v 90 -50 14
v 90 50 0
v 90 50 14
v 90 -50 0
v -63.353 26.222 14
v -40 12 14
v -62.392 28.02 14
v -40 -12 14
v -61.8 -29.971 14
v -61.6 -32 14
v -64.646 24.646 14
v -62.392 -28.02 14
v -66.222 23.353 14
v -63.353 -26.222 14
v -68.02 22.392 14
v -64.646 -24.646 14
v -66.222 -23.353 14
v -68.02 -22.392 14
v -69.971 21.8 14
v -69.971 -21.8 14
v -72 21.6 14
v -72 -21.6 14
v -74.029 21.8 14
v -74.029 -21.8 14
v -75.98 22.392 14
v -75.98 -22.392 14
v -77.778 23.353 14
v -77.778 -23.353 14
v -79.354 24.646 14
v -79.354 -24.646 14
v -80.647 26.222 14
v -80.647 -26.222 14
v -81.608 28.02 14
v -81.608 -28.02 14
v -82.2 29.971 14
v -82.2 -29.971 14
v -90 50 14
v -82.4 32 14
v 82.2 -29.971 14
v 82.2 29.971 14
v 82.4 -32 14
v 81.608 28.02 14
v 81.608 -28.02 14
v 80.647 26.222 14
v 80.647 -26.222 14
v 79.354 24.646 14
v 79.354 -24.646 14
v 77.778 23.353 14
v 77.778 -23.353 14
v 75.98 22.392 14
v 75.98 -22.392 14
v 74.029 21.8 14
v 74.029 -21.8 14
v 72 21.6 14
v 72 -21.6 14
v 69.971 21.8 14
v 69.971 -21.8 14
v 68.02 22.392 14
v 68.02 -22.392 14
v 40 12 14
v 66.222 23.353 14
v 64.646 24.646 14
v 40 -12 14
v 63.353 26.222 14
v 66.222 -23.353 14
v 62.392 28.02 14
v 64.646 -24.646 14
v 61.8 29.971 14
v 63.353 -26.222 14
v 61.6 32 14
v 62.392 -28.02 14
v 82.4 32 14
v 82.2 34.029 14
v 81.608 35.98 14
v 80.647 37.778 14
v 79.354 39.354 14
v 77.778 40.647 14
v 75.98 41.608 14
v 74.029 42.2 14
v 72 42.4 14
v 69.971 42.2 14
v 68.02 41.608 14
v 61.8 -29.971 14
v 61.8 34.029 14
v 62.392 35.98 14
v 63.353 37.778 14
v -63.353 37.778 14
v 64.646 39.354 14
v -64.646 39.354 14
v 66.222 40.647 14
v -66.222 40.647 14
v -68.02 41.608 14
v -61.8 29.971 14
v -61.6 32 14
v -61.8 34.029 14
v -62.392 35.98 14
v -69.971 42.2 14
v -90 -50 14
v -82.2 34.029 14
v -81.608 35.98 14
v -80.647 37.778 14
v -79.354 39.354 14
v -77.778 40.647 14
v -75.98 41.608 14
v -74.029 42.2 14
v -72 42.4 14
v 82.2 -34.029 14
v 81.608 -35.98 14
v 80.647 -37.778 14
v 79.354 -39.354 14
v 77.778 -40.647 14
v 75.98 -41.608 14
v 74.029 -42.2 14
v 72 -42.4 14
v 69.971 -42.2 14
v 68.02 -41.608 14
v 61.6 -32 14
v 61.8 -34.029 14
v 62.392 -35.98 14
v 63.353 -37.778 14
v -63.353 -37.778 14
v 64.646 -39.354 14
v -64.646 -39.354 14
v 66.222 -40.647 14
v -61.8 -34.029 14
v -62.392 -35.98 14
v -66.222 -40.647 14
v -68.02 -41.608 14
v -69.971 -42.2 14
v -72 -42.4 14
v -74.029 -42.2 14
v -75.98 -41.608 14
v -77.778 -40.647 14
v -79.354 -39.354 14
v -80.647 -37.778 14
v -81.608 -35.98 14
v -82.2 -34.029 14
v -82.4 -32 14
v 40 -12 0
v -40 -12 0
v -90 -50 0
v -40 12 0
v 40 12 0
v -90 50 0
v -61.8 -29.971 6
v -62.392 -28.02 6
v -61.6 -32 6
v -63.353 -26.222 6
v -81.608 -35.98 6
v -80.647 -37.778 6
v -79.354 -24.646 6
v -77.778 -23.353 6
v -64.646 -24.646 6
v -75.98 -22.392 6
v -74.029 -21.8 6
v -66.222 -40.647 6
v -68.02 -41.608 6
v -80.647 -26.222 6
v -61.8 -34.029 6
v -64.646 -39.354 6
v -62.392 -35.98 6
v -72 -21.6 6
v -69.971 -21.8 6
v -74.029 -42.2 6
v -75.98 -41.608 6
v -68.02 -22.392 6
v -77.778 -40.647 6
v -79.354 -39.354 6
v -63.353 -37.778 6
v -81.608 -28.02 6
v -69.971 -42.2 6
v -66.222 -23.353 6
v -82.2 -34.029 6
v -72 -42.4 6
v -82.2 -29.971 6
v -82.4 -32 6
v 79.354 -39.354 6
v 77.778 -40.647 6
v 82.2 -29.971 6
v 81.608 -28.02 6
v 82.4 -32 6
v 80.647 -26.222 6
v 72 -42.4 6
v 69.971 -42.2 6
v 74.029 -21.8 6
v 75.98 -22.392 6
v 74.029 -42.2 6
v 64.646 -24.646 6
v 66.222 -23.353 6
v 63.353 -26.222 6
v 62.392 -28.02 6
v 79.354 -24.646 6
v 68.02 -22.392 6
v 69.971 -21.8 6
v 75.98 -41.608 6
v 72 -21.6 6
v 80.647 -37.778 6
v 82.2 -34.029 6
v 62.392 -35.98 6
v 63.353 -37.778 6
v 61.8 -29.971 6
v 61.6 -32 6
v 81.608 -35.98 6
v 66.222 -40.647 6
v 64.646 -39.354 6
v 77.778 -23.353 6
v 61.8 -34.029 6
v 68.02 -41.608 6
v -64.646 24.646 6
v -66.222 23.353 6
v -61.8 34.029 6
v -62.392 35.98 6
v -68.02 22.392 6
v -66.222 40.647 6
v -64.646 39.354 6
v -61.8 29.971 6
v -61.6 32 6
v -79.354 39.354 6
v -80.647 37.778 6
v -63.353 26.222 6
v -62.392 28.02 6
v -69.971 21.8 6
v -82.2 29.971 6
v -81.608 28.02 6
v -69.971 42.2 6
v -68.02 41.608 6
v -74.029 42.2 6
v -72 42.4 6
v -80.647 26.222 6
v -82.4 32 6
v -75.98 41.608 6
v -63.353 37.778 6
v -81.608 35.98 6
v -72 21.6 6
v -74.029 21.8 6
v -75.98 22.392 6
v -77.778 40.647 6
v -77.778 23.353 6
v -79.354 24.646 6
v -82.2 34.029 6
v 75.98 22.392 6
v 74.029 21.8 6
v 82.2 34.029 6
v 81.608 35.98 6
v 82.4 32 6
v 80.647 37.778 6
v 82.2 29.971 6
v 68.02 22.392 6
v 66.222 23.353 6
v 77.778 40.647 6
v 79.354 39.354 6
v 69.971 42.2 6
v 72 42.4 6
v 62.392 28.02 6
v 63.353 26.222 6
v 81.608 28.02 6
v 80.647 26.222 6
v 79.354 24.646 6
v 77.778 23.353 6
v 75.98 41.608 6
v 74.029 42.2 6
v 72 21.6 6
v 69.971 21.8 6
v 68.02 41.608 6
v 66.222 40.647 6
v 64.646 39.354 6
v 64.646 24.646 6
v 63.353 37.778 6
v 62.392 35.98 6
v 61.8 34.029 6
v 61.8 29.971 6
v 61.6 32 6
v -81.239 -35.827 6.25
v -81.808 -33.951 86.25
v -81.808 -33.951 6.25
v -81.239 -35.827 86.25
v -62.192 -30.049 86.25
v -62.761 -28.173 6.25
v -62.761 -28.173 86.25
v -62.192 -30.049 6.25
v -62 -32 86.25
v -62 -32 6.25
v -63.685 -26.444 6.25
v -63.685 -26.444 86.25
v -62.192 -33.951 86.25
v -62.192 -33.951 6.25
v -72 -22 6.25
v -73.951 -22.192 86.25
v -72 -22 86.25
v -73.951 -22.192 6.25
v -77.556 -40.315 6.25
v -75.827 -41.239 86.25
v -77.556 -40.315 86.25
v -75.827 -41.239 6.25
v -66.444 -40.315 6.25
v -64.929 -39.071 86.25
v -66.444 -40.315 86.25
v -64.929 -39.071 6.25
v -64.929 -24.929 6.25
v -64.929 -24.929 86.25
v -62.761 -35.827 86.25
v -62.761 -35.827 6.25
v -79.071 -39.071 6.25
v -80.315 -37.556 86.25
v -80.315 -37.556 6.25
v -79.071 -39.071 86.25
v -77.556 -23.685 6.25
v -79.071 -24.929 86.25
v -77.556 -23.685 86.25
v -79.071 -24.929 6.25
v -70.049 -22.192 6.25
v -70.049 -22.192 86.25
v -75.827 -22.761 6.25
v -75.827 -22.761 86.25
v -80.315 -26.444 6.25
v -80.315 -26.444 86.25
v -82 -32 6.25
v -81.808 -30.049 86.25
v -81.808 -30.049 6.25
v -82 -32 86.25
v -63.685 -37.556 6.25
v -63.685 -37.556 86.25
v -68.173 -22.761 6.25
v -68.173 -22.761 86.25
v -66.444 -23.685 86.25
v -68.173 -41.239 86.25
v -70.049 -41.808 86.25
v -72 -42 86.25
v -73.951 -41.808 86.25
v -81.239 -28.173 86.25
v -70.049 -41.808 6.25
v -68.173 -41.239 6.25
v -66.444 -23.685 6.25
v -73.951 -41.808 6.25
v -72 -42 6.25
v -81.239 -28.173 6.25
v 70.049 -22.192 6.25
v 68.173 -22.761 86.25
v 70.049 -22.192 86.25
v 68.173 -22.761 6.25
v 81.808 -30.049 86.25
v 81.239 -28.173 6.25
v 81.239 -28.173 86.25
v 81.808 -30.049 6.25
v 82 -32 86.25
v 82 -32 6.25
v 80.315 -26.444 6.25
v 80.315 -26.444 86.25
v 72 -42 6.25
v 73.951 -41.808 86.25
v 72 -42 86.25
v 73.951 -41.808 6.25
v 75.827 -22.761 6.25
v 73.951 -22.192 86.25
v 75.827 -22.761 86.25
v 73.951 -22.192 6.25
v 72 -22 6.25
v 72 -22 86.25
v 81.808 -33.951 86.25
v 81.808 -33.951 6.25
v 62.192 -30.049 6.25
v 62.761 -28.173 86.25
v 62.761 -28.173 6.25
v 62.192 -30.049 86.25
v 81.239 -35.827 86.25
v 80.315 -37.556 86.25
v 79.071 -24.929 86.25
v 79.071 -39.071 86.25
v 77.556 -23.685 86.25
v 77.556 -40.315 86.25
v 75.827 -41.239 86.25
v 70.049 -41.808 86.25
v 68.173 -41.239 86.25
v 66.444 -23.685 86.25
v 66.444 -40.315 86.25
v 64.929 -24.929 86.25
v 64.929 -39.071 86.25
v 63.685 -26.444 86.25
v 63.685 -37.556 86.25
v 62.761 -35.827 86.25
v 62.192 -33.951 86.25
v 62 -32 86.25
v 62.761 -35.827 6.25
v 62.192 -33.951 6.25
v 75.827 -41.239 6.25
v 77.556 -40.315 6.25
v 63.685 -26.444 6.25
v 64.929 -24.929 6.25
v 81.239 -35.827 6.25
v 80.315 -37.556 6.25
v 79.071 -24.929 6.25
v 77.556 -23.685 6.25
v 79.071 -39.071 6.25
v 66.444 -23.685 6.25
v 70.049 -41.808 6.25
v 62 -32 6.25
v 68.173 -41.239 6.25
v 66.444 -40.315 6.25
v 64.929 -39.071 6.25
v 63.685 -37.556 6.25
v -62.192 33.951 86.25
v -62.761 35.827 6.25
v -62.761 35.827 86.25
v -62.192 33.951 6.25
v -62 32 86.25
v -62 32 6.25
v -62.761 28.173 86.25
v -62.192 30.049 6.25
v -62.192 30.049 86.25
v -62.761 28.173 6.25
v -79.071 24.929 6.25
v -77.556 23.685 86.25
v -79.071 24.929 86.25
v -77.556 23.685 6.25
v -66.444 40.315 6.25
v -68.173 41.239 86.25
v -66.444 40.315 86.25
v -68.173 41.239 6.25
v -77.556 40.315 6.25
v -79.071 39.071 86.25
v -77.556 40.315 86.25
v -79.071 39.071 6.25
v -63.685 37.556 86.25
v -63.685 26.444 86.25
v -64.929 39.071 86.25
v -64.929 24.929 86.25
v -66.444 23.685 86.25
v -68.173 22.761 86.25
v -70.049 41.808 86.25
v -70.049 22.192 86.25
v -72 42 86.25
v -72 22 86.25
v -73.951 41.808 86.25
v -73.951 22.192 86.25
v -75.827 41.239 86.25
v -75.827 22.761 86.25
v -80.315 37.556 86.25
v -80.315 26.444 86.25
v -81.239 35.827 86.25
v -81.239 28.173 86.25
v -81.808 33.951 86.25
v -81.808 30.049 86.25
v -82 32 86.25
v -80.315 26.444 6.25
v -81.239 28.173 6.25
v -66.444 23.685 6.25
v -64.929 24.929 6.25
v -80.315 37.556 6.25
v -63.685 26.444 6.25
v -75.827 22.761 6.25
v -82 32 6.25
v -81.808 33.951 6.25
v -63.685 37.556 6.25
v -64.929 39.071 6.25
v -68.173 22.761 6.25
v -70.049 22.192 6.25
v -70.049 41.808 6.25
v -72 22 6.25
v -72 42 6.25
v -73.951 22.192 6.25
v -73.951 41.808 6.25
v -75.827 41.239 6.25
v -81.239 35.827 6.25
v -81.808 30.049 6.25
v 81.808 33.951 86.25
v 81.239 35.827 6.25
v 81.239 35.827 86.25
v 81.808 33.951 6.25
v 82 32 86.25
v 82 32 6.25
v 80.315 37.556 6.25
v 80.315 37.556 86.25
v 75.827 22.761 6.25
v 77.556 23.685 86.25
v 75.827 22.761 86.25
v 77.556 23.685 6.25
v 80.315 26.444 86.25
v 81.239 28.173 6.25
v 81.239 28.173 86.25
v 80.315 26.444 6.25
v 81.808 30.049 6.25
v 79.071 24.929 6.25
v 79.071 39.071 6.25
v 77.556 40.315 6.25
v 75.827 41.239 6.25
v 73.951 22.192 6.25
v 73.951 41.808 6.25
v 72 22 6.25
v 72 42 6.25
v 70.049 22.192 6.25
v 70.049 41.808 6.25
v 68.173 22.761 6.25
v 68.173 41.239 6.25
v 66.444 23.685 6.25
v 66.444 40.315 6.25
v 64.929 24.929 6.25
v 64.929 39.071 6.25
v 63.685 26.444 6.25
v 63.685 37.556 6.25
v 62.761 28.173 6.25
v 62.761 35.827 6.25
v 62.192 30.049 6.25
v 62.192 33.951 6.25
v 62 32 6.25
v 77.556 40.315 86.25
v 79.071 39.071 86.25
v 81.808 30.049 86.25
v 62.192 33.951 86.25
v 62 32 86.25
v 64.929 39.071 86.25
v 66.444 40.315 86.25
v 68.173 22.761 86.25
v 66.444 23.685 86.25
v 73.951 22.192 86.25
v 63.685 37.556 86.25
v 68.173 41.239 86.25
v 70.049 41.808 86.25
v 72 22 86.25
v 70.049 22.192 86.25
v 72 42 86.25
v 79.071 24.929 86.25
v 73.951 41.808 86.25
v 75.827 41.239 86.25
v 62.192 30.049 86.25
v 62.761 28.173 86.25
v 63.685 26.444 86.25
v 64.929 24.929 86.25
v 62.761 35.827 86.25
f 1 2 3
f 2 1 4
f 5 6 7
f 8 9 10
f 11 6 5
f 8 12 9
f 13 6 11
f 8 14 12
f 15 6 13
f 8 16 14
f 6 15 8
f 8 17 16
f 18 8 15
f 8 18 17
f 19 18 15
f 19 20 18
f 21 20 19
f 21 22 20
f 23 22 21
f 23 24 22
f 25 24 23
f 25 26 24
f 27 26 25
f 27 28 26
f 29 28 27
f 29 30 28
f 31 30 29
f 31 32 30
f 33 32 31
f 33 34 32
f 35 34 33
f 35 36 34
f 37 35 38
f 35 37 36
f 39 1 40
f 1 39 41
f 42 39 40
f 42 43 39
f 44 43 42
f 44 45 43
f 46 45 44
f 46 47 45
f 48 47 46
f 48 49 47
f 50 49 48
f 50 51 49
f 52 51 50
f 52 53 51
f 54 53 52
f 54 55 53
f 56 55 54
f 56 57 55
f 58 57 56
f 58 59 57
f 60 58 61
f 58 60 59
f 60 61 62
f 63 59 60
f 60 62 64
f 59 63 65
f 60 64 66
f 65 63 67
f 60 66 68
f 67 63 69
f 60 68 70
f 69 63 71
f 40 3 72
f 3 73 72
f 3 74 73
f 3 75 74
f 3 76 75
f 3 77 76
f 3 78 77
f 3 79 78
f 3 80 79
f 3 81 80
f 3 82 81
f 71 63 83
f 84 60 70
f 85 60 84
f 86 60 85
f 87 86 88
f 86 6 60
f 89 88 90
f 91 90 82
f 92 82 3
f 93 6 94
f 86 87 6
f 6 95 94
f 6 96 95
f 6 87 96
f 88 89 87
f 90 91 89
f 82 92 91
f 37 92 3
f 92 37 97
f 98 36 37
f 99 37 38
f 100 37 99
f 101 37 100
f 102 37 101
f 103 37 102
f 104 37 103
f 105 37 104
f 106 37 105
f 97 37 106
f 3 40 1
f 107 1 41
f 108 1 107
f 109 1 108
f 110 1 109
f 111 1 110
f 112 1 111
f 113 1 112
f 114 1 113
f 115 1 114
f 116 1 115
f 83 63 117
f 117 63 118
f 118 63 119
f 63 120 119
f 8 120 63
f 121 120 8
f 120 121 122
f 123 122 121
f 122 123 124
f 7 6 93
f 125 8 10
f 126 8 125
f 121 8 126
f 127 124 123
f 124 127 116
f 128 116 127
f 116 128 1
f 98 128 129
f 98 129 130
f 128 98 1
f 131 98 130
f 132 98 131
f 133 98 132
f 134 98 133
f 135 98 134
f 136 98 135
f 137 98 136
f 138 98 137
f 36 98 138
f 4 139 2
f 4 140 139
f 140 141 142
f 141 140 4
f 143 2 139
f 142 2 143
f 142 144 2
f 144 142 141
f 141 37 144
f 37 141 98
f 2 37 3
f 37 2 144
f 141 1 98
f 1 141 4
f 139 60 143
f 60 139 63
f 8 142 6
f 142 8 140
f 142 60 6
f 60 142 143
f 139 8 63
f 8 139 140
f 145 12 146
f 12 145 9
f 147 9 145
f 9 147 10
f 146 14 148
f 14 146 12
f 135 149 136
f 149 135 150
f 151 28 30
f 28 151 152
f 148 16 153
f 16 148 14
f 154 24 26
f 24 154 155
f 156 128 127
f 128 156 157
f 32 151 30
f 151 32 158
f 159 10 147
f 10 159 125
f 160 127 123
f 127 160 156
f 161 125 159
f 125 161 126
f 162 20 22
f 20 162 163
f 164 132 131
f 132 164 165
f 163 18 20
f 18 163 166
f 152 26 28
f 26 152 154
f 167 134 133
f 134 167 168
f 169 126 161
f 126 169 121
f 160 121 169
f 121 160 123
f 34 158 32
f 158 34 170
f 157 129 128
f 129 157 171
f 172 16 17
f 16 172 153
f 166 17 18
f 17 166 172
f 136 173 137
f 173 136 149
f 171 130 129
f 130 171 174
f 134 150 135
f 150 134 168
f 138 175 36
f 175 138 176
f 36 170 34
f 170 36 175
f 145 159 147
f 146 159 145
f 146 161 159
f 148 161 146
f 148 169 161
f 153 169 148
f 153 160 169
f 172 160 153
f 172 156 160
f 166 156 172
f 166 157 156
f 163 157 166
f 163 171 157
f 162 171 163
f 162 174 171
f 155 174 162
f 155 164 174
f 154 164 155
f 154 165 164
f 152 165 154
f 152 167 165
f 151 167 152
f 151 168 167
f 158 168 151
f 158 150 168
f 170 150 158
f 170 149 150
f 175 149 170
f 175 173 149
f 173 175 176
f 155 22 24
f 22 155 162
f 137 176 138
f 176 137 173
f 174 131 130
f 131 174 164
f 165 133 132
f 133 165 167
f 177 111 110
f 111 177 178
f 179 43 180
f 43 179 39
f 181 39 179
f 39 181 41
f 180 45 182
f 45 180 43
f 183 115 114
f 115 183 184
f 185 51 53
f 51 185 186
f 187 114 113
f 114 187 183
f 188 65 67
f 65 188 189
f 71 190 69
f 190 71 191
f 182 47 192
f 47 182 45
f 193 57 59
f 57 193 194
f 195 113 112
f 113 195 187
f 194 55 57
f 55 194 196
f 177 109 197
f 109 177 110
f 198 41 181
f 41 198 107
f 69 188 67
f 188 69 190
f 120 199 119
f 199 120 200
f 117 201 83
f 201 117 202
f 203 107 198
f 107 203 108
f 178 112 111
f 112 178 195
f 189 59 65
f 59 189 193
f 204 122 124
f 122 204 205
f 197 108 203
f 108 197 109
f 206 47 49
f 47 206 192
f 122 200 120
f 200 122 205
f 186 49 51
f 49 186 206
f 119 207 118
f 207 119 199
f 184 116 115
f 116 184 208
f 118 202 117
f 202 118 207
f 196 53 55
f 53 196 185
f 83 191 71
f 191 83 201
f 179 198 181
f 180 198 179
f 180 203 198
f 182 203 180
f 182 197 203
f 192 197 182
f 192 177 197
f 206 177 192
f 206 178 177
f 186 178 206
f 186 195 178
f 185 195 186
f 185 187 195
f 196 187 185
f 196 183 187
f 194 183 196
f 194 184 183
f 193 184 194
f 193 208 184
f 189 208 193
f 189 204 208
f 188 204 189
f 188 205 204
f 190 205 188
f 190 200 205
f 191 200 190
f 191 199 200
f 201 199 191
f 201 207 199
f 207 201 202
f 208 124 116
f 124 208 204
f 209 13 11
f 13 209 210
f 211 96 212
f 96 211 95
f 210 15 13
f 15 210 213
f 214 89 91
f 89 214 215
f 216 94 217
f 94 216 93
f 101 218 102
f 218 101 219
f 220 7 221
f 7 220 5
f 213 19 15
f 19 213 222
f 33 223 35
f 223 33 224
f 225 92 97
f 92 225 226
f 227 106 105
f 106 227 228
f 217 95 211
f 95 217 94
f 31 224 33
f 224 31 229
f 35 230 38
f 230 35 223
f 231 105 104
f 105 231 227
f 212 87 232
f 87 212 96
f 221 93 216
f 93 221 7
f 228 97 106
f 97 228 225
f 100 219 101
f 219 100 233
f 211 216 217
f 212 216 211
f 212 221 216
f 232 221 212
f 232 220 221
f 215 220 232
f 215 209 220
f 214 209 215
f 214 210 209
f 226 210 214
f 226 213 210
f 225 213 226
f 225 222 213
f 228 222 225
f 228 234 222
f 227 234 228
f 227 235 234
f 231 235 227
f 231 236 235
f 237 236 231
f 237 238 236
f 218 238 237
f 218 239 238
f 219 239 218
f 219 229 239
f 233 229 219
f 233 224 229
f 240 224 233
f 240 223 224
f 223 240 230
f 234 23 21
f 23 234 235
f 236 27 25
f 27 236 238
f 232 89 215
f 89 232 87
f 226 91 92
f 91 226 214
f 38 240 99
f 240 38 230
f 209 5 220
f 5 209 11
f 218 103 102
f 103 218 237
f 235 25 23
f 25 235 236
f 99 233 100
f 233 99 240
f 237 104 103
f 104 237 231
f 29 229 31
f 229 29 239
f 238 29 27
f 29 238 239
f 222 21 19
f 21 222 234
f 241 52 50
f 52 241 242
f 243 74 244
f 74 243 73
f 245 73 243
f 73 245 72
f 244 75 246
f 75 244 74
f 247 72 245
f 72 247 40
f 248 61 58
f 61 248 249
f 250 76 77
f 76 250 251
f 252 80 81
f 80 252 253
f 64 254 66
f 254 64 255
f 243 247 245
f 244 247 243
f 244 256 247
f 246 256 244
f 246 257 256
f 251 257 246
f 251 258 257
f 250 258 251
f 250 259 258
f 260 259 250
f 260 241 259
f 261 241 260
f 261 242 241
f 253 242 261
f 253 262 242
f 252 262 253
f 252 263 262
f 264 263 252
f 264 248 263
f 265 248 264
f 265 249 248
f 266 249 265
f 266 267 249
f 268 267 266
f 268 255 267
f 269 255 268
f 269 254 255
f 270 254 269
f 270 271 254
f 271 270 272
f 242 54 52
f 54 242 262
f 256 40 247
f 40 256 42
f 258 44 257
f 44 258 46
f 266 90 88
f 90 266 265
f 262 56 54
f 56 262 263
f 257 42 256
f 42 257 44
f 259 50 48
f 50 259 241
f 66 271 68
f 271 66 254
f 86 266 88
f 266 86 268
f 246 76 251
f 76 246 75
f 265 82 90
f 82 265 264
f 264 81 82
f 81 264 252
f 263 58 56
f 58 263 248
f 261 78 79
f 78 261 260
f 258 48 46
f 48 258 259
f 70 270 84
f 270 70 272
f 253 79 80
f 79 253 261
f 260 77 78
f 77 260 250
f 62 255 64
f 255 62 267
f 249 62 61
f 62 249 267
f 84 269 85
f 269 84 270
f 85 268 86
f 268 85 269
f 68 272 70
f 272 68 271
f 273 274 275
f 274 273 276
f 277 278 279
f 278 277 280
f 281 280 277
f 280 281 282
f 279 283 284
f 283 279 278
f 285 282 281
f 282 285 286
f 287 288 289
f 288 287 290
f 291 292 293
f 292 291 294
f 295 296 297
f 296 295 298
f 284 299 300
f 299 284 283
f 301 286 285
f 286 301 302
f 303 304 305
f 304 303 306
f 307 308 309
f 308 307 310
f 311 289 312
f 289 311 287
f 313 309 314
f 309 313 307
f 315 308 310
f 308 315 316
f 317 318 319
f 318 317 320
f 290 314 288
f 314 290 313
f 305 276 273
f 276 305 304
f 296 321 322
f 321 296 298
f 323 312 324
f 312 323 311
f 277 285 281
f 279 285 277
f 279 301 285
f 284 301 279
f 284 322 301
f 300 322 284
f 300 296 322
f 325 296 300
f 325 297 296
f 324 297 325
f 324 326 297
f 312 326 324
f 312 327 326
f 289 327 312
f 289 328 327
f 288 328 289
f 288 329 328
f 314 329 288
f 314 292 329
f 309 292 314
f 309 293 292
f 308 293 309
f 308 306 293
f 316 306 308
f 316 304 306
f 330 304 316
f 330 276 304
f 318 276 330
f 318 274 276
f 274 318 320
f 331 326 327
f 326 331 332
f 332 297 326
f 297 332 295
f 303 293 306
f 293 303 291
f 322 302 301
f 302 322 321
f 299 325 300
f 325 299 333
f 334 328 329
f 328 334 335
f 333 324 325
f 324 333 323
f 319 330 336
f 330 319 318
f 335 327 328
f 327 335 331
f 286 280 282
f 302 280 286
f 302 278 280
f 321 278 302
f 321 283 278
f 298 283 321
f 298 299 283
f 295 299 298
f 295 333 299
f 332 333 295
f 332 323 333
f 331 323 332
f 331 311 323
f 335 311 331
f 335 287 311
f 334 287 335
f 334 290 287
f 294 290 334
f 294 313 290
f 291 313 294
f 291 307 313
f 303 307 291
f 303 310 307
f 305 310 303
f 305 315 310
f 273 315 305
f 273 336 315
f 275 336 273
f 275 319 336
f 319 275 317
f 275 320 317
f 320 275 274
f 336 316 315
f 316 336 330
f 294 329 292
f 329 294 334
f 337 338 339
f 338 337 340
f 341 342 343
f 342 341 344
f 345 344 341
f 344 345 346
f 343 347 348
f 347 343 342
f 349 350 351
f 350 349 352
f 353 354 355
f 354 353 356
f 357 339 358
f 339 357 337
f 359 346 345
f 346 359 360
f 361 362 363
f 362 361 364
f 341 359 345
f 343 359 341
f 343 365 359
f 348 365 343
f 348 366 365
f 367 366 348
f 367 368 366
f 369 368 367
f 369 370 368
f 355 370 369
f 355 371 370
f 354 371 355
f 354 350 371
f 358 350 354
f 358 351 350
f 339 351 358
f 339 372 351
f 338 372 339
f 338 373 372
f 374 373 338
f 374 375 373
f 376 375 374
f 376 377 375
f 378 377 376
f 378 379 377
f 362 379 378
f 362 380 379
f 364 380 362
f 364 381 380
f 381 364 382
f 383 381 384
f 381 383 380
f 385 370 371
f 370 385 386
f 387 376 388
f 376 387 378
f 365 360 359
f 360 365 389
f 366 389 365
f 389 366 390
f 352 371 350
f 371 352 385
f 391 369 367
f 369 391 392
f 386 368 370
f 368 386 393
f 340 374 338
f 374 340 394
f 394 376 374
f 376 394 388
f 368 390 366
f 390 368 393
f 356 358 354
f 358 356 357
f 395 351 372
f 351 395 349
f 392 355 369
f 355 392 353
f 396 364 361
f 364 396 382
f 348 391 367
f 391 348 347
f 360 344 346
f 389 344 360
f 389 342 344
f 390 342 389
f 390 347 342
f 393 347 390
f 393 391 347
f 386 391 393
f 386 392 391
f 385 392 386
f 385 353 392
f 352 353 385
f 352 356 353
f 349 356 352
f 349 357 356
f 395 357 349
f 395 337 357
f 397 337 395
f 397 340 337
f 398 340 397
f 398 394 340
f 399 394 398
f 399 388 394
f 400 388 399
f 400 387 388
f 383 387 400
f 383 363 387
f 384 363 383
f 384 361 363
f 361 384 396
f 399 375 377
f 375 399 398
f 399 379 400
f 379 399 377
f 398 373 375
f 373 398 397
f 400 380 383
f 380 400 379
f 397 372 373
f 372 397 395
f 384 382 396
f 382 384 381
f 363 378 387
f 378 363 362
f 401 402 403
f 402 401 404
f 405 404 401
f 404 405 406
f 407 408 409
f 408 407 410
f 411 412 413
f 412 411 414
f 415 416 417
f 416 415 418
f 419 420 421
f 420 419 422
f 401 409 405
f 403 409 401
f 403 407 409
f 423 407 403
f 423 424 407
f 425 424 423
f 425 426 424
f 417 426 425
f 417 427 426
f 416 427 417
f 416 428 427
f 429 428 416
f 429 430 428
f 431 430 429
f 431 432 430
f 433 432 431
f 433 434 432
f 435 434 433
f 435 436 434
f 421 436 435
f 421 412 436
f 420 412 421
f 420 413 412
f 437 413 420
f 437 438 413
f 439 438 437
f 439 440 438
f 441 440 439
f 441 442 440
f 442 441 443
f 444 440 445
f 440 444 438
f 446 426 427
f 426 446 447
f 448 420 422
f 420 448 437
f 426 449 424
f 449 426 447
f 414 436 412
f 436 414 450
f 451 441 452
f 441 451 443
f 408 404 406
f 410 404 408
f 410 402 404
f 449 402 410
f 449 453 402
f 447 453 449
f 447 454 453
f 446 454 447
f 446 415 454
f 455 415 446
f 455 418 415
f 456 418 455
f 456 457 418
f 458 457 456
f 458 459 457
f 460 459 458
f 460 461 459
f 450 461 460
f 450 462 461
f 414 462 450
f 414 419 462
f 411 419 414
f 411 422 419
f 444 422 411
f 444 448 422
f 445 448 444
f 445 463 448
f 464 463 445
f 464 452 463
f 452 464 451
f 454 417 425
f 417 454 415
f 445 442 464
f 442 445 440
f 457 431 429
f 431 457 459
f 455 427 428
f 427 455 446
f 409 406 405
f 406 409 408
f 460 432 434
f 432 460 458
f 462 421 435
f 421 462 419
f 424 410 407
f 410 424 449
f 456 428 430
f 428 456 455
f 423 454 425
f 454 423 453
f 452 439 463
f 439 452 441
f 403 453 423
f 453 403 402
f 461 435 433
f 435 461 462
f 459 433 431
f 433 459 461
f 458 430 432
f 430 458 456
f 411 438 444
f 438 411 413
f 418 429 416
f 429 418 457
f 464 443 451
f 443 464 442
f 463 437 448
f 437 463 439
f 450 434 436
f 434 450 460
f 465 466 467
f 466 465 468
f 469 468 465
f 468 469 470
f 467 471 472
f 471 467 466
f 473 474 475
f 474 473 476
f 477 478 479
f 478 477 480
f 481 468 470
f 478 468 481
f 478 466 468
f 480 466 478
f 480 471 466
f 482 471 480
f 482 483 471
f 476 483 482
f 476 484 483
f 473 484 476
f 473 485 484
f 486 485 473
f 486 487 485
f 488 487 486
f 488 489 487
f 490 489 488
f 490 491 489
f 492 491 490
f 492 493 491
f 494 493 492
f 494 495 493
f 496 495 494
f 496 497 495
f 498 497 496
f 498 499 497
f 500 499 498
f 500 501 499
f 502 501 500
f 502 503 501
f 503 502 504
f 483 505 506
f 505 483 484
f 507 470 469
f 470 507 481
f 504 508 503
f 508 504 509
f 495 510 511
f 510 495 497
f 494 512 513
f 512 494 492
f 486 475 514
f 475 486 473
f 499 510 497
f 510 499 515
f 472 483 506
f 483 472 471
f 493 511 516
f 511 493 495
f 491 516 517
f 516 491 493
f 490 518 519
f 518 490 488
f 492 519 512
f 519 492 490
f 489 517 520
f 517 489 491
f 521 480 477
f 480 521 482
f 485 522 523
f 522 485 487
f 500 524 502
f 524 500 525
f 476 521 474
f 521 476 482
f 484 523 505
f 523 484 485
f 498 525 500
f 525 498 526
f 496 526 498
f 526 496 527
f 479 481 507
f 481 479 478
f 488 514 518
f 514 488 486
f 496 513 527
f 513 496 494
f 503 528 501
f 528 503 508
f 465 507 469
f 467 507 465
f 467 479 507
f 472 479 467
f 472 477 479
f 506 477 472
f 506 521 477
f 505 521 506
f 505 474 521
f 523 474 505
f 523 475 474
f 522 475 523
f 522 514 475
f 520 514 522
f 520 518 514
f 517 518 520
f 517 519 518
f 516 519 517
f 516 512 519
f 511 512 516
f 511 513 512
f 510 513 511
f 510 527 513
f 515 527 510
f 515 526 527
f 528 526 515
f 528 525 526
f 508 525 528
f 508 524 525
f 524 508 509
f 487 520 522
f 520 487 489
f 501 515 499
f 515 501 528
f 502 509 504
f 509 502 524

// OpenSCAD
$fn = 32;

// ------------------------------------------------------------------------
// Frame with four posts: 180 x 100 mm frame, four d20 posts
// Every part is its own module, assembly() places them once.
// ------------------------------------------------------------------------

// --- part 1 ---
module base_frame() {
  difference() {
    translate([-90, -50, 0]) cube([180, 100, 14]);
    translate([-40, -12, -1]) cube([80, 24, 16]);
    translate([-72, -32, 6]) cylinder(h = 9, d = 20.8);
    translate([72, -32, 6]) cylinder(h = 9, d = 20.8);
    translate([-72, 32, 6]) cylinder(h = 9, d = 20.8);
    translate([72, 32, 6]) cylinder(h = 9, d = 20.8);
  }
}

// --- part 2 ---
module post1() {
  cylinder(h = 80, d = 20);
}

// --- part 3 ---
module post2() {
  cylinder(h = 80, d = 20);
}

// --- part 4 ---
module post3() {
  cylinder(h = 80, d = 20);
}

// --- part 5 ---
module post4() {
  cylinder(h = 80, d = 20);
}

// --- assembly ---
module assembly() {
  translate([0, 0, 0]) rotate([0, 0, 0]) base_frame();
  translate([-72, -32, 6.25]) rotate([0, 0, 0]) post1();
  translate([72, -32, 6.25]) rotate([0, 0, 0]) post2();
  translate([-72, 32, 6.25]) rotate([0, 0, 0]) post3();
  translate([72, 32, 6.25]) rotate([0, 0, 0]) post4();
}

assembly();
